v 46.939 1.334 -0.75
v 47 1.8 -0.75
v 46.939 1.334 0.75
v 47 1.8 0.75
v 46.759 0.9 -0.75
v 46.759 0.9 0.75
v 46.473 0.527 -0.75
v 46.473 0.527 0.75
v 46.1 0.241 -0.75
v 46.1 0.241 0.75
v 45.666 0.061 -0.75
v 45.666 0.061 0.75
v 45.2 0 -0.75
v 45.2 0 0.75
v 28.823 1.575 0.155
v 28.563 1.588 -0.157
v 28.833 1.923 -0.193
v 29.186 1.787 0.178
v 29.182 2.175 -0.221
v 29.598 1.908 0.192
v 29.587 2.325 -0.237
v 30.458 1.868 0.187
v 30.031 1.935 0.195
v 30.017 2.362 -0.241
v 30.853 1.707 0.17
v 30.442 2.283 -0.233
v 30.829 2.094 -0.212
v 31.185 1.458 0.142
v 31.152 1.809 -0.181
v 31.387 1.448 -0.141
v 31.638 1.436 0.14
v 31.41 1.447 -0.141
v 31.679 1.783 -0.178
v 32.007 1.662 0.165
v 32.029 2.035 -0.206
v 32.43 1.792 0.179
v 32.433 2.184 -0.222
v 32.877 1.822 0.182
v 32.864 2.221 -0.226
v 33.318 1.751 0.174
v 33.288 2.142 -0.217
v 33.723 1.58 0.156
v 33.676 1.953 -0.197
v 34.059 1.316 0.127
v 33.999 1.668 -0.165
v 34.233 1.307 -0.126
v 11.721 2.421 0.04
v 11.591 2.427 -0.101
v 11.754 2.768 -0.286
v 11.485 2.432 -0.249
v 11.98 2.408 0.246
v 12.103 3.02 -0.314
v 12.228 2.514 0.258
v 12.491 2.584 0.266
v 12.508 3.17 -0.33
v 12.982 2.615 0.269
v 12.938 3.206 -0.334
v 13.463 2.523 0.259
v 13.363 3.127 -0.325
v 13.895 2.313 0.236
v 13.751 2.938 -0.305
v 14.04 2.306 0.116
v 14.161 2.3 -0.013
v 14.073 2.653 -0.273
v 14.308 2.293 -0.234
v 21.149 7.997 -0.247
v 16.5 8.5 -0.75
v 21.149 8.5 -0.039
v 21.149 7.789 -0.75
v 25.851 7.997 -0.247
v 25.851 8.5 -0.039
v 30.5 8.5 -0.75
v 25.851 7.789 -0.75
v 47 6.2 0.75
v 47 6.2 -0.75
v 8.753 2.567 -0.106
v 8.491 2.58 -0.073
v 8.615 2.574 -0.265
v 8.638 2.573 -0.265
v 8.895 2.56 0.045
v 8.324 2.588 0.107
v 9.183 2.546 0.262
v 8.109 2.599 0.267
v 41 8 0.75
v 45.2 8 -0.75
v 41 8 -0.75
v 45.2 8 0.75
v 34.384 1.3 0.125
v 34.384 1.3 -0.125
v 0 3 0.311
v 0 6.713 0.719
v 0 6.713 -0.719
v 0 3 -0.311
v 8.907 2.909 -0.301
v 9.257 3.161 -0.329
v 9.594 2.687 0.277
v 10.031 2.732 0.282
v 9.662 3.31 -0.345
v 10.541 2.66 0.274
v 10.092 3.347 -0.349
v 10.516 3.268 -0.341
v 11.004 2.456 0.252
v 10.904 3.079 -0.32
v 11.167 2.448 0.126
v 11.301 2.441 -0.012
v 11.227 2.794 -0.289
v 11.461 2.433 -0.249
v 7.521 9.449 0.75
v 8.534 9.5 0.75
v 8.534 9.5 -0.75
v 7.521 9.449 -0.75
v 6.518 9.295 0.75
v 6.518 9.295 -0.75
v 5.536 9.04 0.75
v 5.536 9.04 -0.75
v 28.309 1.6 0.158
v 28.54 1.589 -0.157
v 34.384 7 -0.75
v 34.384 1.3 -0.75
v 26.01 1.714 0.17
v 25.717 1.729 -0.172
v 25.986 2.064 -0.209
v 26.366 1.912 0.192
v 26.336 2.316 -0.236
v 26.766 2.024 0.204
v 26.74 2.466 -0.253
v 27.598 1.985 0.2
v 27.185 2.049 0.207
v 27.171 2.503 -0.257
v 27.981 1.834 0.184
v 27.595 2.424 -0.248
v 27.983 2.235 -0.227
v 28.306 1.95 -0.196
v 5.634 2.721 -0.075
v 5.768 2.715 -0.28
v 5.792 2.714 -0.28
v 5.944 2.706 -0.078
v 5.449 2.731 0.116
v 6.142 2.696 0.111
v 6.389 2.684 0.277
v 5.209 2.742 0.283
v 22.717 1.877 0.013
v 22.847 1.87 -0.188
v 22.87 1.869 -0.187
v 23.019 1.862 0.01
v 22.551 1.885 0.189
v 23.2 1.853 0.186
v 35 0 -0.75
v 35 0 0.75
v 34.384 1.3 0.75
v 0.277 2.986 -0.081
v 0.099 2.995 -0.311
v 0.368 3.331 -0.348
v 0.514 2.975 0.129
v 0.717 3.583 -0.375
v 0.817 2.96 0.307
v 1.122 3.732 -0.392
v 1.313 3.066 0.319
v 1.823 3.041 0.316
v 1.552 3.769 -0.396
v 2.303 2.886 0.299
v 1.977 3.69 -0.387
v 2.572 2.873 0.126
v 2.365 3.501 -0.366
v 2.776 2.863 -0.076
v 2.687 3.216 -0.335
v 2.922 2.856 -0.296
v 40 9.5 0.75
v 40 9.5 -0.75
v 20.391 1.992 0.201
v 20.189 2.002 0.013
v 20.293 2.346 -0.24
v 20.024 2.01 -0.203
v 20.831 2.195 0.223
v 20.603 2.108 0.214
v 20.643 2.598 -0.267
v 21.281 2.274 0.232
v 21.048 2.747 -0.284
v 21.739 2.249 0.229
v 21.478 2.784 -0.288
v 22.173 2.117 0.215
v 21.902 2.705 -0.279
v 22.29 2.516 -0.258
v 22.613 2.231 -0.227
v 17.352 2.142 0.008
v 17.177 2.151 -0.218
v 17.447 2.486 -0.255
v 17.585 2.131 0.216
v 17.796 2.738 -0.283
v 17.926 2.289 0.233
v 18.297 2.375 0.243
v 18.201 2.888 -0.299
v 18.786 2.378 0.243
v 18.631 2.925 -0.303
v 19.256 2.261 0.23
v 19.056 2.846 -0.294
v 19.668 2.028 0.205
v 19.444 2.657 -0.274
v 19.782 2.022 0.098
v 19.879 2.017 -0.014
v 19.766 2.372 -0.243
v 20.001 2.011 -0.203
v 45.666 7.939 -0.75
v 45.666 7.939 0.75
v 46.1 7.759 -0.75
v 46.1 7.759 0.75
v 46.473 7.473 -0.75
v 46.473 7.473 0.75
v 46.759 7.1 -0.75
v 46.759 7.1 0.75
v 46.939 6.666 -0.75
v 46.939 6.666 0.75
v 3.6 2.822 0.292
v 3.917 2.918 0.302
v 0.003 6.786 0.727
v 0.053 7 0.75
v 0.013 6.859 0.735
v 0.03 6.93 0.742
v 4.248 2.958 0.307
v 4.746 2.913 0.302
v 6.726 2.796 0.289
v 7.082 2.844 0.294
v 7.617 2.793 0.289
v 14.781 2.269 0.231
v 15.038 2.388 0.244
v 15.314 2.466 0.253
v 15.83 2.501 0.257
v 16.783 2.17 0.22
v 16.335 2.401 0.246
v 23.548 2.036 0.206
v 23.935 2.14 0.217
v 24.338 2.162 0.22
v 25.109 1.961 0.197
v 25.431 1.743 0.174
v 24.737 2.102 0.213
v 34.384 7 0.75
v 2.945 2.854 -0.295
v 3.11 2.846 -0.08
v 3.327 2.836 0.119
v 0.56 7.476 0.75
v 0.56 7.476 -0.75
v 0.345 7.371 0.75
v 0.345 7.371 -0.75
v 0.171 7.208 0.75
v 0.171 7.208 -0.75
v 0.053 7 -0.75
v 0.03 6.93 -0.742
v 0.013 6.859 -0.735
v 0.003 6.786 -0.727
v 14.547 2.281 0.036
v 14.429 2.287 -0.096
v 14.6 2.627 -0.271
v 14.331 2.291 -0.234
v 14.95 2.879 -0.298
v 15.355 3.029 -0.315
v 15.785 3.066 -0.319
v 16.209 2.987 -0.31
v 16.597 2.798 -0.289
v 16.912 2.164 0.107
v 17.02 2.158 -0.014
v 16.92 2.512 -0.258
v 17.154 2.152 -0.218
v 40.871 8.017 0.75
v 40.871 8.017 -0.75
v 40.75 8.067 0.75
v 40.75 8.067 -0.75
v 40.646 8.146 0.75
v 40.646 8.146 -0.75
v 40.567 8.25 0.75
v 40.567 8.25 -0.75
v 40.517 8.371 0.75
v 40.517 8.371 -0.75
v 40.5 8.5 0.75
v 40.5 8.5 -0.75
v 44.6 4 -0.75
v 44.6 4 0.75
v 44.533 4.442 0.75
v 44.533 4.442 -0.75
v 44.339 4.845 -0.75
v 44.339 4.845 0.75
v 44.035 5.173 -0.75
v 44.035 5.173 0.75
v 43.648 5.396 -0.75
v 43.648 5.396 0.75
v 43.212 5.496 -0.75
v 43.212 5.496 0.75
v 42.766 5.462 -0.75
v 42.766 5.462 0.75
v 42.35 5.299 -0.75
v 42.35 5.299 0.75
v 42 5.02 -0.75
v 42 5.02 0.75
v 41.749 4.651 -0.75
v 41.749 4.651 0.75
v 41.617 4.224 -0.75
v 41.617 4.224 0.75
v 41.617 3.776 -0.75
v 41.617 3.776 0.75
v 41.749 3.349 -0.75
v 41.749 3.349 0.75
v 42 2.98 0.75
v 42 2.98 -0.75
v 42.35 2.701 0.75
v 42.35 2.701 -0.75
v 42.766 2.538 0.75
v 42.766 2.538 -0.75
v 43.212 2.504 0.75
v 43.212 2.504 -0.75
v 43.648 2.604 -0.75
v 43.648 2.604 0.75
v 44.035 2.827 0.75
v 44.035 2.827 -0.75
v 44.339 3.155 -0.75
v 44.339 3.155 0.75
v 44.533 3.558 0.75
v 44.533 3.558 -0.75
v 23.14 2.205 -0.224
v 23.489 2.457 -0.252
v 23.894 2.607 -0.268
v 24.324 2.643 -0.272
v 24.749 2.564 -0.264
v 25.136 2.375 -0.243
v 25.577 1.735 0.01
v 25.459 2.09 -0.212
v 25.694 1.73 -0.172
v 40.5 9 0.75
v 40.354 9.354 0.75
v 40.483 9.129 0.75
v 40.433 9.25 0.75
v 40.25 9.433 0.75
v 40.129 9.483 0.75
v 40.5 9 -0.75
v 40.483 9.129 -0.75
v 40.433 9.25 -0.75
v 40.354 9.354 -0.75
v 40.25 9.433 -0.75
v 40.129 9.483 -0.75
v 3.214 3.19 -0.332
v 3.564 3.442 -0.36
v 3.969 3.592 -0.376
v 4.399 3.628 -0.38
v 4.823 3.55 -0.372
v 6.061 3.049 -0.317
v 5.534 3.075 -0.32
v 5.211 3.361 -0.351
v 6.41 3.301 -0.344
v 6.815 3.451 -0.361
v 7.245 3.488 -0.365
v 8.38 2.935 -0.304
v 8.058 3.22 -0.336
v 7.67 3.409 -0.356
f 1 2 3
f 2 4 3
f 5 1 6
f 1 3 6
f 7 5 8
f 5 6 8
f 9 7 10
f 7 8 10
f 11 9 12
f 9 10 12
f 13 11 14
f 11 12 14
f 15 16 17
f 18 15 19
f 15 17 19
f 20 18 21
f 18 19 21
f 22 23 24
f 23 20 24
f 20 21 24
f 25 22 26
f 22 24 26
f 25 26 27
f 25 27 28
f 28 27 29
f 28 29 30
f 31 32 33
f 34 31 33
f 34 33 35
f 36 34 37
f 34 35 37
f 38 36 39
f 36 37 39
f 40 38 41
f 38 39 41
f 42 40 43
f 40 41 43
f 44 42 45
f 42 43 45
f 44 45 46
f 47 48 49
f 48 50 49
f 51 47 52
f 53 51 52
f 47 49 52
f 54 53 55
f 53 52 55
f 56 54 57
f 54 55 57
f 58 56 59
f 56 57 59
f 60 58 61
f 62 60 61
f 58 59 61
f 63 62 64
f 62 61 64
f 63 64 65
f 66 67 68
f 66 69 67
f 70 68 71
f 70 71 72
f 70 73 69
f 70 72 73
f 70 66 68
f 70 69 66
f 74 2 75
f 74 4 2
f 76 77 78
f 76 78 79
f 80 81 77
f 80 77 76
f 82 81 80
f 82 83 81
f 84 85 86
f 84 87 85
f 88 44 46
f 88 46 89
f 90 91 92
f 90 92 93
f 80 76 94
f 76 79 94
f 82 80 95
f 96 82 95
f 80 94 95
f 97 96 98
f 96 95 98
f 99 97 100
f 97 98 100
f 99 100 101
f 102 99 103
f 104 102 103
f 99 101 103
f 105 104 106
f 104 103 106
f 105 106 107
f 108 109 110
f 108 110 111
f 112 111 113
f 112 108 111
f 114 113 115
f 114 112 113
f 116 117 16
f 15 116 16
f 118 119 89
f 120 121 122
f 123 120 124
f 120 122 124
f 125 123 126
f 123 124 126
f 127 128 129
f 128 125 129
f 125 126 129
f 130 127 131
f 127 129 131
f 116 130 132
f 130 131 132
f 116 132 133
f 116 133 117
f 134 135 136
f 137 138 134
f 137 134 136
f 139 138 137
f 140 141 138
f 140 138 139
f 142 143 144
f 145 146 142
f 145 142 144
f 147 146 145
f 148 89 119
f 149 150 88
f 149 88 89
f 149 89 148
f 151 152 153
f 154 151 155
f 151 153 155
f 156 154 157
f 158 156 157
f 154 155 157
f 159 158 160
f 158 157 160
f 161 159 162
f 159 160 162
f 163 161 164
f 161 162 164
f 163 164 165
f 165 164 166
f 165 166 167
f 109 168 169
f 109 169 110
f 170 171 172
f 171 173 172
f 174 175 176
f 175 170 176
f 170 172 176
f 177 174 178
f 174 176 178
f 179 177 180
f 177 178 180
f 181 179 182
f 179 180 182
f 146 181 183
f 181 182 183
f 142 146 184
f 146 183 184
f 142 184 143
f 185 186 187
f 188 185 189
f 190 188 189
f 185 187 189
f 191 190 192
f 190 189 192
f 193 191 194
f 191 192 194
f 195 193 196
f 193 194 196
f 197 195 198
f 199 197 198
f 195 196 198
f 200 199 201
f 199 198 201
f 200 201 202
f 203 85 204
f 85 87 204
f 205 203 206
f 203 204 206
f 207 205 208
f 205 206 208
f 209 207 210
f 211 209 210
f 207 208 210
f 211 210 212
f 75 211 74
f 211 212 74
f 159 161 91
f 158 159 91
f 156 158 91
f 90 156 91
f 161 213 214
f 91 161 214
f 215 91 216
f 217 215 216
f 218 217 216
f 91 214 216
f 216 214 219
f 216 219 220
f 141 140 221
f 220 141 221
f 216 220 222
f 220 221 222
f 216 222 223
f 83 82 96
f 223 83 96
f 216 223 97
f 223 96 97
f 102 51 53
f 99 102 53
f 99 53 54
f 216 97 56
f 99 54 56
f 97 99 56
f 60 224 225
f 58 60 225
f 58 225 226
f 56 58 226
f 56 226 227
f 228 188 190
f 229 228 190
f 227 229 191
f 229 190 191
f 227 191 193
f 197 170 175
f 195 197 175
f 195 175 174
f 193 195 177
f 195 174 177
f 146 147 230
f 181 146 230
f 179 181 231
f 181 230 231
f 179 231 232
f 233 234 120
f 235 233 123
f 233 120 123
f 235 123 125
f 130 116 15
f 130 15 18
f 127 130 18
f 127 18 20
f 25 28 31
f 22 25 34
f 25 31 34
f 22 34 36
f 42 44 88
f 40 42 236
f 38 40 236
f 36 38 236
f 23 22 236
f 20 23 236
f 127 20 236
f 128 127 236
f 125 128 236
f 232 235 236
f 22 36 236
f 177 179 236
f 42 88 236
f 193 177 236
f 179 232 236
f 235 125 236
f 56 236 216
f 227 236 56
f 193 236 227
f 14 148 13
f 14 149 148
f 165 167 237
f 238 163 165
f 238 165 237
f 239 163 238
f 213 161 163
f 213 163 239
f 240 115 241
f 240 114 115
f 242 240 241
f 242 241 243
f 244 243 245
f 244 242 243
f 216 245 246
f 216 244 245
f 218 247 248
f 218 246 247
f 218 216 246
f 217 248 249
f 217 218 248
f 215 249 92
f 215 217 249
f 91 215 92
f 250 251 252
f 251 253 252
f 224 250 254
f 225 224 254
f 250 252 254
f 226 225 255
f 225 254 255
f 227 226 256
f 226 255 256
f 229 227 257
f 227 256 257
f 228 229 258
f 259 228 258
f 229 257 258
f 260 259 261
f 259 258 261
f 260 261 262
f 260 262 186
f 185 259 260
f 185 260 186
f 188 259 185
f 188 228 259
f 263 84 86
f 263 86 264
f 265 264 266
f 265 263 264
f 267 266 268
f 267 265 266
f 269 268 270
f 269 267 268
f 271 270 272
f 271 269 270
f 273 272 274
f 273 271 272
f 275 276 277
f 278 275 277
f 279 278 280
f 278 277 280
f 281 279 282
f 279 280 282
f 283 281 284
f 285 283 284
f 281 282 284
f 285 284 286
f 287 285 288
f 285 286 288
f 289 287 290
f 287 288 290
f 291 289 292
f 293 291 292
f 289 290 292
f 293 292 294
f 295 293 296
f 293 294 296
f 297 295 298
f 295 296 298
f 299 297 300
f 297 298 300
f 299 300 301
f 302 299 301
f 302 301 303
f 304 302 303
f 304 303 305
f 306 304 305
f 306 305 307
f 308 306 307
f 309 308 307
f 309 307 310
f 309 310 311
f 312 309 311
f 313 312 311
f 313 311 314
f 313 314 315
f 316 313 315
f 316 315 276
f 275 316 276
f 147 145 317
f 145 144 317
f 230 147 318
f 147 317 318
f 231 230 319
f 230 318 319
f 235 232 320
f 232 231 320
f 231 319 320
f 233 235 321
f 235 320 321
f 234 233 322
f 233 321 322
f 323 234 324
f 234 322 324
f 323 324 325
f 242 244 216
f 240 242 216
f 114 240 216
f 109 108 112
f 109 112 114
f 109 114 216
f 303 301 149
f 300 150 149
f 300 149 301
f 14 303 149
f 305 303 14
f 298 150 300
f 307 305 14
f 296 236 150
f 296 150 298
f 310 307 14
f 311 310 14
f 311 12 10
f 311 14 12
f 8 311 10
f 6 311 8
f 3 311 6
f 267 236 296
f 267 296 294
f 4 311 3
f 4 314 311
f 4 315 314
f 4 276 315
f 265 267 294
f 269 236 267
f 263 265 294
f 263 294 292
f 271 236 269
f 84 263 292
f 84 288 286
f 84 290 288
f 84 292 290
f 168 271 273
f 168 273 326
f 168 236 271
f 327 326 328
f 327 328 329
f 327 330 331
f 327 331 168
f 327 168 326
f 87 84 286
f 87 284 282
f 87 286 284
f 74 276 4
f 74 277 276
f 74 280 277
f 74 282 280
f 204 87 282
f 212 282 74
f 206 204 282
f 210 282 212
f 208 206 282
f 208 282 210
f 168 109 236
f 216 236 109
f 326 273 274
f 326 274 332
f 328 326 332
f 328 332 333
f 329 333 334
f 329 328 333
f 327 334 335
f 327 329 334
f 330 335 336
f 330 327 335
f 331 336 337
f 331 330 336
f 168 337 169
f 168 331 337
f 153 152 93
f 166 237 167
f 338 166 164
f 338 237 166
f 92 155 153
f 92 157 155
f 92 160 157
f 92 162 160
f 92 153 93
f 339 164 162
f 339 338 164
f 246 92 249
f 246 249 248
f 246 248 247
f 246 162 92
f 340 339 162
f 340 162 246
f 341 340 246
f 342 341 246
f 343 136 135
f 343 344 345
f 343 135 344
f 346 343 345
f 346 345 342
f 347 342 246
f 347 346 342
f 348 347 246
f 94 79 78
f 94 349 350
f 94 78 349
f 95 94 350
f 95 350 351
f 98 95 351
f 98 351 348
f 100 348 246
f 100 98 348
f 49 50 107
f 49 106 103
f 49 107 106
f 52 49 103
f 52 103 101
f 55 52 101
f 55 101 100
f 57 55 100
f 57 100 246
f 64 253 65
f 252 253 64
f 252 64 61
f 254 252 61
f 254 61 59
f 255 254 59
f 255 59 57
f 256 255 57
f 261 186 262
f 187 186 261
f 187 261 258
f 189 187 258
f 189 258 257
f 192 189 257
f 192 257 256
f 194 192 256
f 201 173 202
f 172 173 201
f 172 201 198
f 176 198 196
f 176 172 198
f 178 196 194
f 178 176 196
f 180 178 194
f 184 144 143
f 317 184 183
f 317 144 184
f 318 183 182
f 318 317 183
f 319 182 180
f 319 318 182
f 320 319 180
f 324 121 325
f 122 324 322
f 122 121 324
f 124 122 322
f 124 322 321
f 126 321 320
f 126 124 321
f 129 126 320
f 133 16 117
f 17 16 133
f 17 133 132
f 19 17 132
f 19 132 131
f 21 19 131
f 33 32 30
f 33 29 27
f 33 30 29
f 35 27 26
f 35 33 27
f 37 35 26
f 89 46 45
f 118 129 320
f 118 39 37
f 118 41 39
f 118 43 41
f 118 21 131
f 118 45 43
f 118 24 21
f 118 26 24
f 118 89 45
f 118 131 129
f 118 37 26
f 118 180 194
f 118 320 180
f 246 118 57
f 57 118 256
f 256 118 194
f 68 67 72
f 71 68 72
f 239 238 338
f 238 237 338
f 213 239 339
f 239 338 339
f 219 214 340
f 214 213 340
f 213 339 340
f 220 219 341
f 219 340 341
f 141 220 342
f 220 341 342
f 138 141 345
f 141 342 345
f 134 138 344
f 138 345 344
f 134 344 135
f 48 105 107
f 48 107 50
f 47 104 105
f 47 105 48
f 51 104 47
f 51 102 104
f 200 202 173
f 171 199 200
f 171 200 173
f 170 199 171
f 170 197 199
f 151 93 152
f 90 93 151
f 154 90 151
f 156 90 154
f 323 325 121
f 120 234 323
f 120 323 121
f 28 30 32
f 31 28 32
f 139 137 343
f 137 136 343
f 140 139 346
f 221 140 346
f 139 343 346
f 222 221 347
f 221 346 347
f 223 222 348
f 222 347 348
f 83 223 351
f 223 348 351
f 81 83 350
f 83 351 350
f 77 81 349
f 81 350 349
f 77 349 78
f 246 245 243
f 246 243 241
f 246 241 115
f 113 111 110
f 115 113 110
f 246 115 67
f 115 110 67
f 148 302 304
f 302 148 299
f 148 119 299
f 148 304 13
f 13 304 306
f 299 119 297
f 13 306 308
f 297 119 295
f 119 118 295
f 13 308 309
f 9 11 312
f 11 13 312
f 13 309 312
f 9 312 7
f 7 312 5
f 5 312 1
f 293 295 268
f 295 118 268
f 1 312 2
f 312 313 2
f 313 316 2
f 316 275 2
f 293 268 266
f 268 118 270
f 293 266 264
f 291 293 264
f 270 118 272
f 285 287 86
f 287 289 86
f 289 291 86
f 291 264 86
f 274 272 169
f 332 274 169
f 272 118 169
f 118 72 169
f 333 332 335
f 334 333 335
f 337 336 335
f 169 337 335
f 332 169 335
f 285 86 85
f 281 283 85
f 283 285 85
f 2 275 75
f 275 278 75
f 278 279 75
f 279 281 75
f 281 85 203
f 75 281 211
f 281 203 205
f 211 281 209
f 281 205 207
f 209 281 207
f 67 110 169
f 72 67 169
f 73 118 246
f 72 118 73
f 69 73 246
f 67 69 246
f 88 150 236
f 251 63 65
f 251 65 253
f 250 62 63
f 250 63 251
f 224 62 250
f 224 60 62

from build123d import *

# Parameters (mm, degrees)
BOSS_EXTRUDE1_DEPTH = 0.75
FILLET1_R           = 1.8
CUT_EXTRUDE3_DEPTH  = 36.680336791
SKETCH5_R           = 1.6
CUT_EXTRUDE4_DEPTH  = 20.5
LPATTERN1_COUNT     = 12
LPATTERN1_PITCH     = 2.85
SKETCH8_R           = 1.5
CUT_EXTRUDE5_DEPTH  = 20.5
CUT_REVOLVE1_ANGLE  = 90


with BuildPart() as part:
    # Sketch1 → Boss-Extrude1 (new, symmetric)
    with BuildSketch(Plane.XY):
        with BuildLine():
            Line((0, 6.712848625), (0, 3))
            Line((0, 3), (34.384210526, 1.3))
            Line((34.384210526, 1.3), (30.5, 9.5))
            Line((30.5, 9.5), (8.534429687, 9.5))
            ThreePointArc((8.534429687, 9.5), (7.017751028, 9.384315143), (5.53616372, 9.039937169))
            Line((5.53616372, 9.039937169), (0.560138723, 7.476043599))
            ThreePointArc((0.560138723, 7.476043599), (0.155062398, 7.186193625), (0, 6.712848625))
        make_face()
        with BuildLine():
            Line((30.5, 9.5), (34.384210526, 1.3))
            Line((34.384210526, 1.3), (35, 0))
            Line((35, 0), (47, 0))
            Line((47, 0), (47, 8))
            Line((47, 8), (41, 8))
            ThreePointArc((41, 8), (40.646446609, 8.146446609), (40.5, 8.5))
            Line((40.5, 8.5), (40.5, 9))
            ThreePointArc((40.5, 9), (40.353553391, 9.353553391), (40, 9.5))
            Line((40, 9.5), (30.5, 9.5))
        make_face()
    extrude(amount=BOSS_EXTRUDE1_DEPTH, both=True)

    # Fillet1
    fillet1_edges = [part.edges().sort_by_distance(p)[0] for p in [
        (47, 8, 0),
        (47, 0, 0),
    ]]
    fillet(fillet1_edges, radius=FILLET1_R)

    # Sketch4 → Cut-Extrude3 (cut, through all)
    with BuildSketch(Plane(origin=(34.384210526, 0, 0), x_dir=(0, 0, -1), z_dir=(1, 0, 0))):
        Polygon((-0.75, 1.3), (-0.125, 1.3), (-0.75, 7), align=None)
        Polygon((0.75, 1.3), (0.125, 1.3), (0.75, 7), align=None)
    extrude(amount=-CUT_EXTRUDE3_DEPTH, mode=Mode.SUBTRACT)

    # Sketch5 → Cut-Extrude4 (cut, along a direction that is not the sketch's normal)
    with BuildSketch(Plane(origin=(0, 0.001900815, 0.017335437), x_dir=(-1, 0, 0), z_dir=(0, -0.10899585570756742, -0.9940422040530147))):
        with Locations((-32.784210526, 0.634532433)):
            Circle(SKETCH5_R)
    cut_extrude4 = extrude(amount=-CUT_EXTRUDE4_DEPTH, dir=(0, 0.6987711700907747, -0.7153452675806066), mode=Mode.SUBTRACT)

    # LPattern1: Cut-Extrude4 ×12
    with Locations(*[Vector(-0.998765374567026, 0.049380256541427955, -0.005414501813753065) * (i * LPATTERN1_PITCH) for i in range(1, LPATTERN1_COUNT)]):
        add(cut_extrude4, mode=Mode.SUBTRACT)

    # Sketch8 → Cut-Extrude5 (cut)
    with BuildSketch(Plane.XY.offset(0.75)):
        with Locations((43.1, 4)):
            Circle(SKETCH8_R)
    extrude(amount=-CUT_EXTRUDE5_DEPTH, mode=Mode.SUBTRACT)

    # Sketch2 → Cut-Revolve1 (revolve, cut)
    with BuildSketch(Plane(origin=(0, 0, -0.75), x_dir=(-1, 0, 0), z_dir=(0, 0, -1))):
        with BuildLine():
            Line((-30.5, 8.5), (-16.5, 8.5))
            ThreePointArc((-16.5, 8.5), (-23.5, 7.699337741), (-30.5, 8.5))
        make_face()
    revolve(axis=Axis((30.5, 8.5, -0.75), (-1, 0, 0)), revolution_arc=CUT_REVOLVE1_ANGLE, mode=Mode.SUBTRACT)


solid = part.part
